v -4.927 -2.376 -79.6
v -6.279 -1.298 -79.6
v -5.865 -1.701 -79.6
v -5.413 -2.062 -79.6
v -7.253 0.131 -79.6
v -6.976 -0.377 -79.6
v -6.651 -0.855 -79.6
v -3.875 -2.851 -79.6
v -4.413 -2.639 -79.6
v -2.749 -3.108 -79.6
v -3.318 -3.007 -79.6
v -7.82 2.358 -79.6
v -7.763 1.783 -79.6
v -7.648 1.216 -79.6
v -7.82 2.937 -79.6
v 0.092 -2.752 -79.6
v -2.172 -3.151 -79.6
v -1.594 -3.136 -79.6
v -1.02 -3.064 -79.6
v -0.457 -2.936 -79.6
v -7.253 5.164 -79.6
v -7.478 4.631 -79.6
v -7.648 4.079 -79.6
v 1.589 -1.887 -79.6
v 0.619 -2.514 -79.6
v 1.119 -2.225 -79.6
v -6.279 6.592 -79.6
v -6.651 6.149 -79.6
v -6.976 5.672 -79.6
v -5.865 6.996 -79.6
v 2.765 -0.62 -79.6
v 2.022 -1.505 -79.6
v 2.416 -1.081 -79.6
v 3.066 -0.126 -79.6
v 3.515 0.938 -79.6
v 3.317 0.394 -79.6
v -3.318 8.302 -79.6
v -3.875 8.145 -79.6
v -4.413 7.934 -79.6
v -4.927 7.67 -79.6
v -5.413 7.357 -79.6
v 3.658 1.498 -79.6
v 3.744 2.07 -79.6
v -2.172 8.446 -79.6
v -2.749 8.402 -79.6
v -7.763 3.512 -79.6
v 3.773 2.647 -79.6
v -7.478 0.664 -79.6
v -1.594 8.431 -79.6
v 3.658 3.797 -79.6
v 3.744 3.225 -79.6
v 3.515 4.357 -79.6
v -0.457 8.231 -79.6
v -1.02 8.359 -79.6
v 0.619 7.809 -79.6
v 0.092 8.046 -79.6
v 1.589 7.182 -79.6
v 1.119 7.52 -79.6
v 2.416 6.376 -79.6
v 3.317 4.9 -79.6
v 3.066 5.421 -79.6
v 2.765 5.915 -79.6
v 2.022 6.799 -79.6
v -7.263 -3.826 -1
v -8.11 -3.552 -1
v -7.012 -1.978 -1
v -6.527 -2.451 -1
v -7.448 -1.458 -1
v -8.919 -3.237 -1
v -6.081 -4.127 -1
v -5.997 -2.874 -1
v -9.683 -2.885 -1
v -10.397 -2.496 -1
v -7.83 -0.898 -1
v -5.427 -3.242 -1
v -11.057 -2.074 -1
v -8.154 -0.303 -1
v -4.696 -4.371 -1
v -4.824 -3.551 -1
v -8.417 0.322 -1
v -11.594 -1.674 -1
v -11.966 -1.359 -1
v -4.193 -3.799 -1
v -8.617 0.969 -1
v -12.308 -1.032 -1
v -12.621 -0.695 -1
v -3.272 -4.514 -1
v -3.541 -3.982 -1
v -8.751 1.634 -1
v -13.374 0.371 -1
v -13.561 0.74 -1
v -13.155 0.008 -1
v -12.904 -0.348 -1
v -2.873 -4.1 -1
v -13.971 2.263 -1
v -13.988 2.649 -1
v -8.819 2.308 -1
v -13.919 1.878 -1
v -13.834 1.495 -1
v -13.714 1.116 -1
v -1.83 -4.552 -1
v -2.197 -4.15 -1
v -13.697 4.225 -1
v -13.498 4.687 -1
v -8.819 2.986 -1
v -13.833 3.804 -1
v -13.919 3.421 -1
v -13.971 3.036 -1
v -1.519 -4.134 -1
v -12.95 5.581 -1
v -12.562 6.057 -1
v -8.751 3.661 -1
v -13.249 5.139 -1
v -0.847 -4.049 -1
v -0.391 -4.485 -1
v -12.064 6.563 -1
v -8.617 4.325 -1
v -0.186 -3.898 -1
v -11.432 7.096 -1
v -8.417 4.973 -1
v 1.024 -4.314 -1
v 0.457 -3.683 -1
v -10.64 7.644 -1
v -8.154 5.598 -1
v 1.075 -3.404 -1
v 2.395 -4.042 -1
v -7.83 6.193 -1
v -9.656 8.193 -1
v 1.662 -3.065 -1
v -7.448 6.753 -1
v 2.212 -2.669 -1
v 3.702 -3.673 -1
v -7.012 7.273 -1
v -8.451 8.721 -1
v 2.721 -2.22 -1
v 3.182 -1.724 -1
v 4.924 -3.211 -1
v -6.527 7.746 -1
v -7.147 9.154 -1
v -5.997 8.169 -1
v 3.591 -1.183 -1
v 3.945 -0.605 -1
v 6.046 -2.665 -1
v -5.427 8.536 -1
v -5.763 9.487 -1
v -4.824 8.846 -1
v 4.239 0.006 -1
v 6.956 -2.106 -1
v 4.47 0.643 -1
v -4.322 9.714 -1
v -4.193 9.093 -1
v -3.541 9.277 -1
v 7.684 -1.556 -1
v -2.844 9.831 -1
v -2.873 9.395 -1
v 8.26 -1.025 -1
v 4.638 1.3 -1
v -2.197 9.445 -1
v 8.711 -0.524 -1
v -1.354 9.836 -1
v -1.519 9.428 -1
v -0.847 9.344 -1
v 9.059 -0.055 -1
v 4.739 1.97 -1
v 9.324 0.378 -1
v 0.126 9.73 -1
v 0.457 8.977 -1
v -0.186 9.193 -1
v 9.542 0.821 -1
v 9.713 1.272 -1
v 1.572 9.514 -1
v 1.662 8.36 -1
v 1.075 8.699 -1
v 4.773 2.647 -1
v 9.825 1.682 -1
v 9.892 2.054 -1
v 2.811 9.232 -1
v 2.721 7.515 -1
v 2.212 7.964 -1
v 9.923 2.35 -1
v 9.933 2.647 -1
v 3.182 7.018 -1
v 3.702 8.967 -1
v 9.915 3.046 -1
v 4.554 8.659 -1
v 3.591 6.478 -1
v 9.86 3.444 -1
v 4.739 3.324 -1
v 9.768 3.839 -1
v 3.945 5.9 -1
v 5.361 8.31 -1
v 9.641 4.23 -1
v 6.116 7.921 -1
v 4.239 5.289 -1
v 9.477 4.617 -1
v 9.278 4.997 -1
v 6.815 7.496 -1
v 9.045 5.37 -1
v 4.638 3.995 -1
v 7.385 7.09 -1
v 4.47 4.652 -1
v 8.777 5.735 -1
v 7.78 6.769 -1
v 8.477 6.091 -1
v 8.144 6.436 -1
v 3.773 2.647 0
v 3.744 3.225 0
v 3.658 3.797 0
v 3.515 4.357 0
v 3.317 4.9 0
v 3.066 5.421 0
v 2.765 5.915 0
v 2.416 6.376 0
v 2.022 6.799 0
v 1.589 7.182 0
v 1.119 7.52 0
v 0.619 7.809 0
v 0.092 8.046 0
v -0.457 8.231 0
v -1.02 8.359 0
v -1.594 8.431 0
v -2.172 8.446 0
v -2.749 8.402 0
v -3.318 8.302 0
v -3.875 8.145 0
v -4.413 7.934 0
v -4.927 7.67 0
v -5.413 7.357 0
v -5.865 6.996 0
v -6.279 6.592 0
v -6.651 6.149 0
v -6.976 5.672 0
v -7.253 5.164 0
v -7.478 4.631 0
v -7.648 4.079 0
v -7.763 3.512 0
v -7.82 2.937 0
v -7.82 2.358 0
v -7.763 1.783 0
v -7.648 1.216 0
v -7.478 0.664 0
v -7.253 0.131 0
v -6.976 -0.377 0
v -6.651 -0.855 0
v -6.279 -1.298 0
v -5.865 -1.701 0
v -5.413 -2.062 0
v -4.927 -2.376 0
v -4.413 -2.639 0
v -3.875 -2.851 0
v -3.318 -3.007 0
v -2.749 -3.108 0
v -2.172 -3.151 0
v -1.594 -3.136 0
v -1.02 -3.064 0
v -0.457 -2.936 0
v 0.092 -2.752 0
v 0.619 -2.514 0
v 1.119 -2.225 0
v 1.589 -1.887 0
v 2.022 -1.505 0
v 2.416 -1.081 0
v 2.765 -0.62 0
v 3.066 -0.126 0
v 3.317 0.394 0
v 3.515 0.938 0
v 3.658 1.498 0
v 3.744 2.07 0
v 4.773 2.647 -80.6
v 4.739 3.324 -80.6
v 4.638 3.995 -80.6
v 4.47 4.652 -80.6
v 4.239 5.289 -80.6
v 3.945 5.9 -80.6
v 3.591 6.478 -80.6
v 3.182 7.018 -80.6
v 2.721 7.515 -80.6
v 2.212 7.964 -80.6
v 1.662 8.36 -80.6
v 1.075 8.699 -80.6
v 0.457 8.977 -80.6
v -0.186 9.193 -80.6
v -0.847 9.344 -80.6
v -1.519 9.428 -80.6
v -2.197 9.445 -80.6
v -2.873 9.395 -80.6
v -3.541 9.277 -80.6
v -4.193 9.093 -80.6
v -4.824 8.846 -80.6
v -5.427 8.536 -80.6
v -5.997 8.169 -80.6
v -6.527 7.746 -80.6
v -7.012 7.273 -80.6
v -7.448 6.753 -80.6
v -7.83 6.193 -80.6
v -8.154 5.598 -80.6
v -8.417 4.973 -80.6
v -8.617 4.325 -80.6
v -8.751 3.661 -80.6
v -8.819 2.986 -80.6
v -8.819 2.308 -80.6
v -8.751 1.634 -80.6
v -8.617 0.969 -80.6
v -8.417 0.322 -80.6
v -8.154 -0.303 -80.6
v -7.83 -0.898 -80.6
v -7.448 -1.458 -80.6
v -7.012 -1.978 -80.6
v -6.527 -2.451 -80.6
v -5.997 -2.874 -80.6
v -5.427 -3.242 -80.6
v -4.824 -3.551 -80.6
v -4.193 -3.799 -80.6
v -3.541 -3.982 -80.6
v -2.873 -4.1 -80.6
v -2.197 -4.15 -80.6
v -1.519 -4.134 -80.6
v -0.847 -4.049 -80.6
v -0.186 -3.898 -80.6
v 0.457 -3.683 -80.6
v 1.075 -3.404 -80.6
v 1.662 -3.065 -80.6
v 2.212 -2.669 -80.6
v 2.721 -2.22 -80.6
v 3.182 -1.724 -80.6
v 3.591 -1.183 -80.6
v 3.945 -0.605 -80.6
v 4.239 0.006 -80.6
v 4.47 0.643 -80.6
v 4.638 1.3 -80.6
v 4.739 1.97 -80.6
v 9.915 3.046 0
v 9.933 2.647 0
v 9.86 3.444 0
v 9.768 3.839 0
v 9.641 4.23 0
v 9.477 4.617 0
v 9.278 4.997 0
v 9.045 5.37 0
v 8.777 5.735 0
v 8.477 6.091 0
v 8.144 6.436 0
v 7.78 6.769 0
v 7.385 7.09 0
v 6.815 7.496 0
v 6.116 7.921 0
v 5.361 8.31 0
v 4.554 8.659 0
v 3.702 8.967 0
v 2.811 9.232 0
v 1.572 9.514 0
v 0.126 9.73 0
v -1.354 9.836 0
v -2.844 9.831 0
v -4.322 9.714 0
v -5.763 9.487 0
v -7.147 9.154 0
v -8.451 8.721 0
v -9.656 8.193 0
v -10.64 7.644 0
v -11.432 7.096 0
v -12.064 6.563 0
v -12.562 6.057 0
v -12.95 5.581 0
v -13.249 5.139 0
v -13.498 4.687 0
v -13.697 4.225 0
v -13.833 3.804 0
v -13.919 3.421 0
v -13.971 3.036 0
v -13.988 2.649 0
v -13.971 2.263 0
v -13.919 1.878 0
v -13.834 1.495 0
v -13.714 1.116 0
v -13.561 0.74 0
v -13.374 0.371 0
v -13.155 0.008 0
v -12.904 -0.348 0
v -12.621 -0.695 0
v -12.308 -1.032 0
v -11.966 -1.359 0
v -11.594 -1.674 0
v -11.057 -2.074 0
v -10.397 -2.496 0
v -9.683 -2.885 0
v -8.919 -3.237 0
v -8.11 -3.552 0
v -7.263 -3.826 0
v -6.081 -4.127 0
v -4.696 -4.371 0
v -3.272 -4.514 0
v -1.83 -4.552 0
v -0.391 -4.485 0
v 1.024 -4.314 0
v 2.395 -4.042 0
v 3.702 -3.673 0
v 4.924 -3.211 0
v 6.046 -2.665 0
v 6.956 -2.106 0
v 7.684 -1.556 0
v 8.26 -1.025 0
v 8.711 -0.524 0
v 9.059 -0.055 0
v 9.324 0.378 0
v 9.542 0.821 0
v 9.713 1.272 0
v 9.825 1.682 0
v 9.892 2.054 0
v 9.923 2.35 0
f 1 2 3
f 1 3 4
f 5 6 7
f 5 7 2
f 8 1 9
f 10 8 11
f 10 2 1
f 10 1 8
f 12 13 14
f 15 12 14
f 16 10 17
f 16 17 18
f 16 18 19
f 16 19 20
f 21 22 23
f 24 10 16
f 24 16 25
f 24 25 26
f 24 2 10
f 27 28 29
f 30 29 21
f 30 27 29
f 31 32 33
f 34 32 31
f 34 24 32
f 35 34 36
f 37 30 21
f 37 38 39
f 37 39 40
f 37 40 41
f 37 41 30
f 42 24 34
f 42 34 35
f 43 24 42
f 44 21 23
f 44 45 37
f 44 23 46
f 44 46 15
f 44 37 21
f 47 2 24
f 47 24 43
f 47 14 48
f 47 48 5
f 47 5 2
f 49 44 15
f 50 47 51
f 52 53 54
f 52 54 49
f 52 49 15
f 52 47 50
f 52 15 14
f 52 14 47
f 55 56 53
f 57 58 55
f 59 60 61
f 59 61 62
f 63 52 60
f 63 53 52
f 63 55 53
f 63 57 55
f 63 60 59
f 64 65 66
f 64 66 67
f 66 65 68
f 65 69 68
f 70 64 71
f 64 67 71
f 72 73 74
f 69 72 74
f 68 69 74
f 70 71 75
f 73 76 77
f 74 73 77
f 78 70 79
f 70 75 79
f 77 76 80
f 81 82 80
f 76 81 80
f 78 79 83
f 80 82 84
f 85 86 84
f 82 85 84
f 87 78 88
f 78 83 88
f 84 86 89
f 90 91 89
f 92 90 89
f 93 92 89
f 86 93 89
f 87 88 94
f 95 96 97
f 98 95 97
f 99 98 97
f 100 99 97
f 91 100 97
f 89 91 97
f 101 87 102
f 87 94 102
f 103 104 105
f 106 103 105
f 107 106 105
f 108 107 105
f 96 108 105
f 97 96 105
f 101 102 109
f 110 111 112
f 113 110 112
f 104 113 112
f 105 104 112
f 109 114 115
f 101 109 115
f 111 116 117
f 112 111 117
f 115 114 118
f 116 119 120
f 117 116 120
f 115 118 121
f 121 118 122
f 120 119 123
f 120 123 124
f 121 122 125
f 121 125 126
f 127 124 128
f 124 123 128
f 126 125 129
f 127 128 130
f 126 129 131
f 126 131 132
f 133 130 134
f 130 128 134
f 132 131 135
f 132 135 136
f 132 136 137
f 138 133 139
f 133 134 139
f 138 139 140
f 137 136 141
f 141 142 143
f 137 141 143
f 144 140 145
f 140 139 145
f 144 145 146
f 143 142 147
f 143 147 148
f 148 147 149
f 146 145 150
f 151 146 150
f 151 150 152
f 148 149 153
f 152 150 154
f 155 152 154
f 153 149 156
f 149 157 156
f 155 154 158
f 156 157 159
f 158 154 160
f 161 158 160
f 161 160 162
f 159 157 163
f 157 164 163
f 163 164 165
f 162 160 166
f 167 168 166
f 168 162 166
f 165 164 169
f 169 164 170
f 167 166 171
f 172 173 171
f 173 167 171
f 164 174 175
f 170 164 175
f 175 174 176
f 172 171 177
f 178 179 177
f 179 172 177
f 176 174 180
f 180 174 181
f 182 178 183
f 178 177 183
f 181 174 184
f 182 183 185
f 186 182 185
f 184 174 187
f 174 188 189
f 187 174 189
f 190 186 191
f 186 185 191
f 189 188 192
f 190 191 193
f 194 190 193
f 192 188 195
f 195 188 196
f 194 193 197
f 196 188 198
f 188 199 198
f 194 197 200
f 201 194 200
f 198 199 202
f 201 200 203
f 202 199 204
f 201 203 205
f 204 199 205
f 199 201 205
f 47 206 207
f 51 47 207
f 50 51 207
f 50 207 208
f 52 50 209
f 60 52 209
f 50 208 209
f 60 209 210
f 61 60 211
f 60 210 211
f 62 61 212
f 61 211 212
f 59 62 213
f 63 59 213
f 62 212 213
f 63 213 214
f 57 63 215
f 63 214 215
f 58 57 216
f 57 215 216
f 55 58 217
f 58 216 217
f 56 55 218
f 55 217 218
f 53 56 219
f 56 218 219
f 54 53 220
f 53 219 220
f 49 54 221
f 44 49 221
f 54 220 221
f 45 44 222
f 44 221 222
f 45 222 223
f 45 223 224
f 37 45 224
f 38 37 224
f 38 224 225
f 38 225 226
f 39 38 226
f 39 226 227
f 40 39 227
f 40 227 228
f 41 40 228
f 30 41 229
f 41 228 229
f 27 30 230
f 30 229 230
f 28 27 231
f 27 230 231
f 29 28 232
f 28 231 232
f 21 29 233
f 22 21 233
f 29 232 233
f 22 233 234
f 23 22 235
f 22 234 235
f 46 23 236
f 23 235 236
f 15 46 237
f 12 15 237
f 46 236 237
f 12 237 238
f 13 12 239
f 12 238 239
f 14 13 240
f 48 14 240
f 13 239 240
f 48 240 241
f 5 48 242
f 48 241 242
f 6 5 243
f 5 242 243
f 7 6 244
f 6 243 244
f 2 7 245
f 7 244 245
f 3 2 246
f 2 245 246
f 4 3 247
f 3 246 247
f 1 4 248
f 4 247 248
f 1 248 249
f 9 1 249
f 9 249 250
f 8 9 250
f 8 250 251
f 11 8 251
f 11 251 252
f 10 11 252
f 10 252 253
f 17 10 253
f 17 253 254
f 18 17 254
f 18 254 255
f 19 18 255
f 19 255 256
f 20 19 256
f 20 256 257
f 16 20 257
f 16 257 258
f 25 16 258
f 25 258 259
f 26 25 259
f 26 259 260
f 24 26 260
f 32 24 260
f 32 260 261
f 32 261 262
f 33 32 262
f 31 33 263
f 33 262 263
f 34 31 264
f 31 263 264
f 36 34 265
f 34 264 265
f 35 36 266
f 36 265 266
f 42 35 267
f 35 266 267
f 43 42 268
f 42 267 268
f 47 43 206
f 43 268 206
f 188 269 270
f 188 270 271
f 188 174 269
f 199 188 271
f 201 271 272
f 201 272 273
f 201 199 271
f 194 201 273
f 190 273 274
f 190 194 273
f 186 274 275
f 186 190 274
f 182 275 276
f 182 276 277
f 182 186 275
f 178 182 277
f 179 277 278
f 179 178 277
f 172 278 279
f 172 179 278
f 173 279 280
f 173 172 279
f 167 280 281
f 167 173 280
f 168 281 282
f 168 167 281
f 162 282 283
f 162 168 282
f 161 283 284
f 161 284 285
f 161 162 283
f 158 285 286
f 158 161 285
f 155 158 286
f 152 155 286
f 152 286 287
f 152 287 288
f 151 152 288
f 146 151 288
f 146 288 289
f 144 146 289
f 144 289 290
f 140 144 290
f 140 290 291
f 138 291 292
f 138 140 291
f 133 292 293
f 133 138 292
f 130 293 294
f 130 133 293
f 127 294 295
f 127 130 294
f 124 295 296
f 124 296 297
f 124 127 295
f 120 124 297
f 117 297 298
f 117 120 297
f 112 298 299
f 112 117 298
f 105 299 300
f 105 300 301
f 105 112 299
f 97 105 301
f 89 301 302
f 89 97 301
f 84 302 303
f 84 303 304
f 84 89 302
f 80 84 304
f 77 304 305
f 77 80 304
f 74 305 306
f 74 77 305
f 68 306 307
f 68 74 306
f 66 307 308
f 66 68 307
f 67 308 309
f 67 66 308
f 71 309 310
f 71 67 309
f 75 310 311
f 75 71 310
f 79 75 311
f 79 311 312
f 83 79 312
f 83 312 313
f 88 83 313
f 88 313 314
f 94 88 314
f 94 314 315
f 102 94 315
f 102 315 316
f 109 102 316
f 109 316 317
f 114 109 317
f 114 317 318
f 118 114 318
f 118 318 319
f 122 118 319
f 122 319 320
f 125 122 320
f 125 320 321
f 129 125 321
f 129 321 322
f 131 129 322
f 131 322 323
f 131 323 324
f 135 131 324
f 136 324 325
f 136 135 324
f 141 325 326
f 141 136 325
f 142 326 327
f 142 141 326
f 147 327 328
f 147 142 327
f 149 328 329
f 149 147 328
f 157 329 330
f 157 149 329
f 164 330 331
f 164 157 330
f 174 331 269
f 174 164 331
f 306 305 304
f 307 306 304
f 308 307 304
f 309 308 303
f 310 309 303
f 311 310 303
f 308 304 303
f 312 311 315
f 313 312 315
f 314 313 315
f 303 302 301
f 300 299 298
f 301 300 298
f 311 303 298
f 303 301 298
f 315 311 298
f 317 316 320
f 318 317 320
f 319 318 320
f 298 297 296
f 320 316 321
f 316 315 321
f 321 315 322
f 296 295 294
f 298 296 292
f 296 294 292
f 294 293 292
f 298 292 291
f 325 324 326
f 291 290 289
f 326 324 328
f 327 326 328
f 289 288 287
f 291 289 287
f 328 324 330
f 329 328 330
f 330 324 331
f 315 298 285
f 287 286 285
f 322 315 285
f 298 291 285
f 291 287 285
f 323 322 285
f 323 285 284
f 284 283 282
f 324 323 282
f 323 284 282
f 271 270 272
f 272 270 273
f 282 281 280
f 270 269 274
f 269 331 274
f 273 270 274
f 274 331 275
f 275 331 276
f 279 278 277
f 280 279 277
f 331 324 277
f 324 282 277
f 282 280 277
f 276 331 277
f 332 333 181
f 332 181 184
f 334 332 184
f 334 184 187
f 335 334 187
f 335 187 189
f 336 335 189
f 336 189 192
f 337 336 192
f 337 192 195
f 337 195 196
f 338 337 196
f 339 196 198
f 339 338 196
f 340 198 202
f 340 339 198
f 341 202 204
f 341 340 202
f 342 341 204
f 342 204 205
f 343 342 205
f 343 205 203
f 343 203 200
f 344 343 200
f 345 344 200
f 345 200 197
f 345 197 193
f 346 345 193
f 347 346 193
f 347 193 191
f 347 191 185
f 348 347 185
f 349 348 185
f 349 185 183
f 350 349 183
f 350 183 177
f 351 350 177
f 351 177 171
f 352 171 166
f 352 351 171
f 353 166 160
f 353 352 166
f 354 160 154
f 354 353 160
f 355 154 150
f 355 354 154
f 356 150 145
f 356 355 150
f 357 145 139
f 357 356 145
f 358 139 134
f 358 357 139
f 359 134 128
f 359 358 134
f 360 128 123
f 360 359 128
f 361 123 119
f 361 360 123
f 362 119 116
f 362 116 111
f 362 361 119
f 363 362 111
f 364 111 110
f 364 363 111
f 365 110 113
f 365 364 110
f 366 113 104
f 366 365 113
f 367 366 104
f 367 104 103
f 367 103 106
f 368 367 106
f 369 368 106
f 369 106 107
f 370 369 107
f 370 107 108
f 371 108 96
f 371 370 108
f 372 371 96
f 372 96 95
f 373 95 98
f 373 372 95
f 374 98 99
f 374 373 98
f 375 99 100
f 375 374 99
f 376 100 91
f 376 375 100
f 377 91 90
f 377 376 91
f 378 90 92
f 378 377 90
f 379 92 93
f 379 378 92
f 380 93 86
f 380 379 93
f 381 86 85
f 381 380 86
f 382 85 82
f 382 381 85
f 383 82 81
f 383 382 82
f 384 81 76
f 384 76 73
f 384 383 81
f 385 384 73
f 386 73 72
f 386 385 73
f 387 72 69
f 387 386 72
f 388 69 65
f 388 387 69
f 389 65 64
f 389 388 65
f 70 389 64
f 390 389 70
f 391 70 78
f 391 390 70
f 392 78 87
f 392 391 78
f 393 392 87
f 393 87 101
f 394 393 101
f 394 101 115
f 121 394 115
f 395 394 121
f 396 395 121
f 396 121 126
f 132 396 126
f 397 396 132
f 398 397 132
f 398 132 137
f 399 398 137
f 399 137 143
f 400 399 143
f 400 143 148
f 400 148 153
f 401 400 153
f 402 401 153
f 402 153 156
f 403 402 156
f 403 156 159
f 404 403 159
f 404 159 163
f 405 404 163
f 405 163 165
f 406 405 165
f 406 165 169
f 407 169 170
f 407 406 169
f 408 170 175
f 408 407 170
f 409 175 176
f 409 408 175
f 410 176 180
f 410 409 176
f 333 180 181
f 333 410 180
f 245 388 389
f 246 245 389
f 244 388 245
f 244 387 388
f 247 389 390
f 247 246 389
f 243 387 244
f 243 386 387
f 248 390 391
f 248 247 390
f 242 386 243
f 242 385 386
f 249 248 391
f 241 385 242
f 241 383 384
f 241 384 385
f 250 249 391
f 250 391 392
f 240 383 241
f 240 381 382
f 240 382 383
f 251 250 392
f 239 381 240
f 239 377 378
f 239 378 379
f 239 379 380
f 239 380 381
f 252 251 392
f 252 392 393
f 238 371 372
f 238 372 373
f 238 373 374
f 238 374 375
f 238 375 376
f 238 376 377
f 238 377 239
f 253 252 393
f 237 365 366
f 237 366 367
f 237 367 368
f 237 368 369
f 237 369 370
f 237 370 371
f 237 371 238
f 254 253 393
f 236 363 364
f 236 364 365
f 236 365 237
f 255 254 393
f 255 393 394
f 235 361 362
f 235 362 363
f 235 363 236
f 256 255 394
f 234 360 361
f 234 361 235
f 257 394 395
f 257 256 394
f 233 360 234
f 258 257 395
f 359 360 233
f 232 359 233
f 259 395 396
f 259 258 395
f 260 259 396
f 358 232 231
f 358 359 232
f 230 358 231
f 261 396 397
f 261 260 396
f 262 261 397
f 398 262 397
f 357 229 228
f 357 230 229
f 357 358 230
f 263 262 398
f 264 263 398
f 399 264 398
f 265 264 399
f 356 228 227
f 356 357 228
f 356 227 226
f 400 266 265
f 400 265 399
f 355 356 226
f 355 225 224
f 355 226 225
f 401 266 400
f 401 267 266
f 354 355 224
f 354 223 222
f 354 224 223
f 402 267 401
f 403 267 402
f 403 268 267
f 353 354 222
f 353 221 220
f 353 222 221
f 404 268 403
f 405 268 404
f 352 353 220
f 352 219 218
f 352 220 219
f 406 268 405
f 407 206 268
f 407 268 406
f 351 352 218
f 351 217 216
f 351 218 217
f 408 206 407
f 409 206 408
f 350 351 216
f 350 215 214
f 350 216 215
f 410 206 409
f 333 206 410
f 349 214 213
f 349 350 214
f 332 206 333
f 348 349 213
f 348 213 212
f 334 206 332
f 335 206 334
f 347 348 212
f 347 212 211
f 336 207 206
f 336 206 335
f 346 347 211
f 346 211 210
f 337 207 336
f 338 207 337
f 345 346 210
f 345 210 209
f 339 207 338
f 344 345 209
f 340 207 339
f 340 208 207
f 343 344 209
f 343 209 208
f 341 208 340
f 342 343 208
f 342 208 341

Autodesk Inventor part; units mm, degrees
ref_plane "YZ Plane" through (0, 0, 0) normal (1, 0, 0) x (0, 1, 0)
ref_plane "XZ Plane" through (0, 0, 0) normal (0, 1, 0) x (-1, 0, 0)
ref_plane "XY Plane" through (0, 0, 0) normal (0, 0, 1) x (1, 0, 0)
sketch "Sketch2" plane through (0, 0, 0) normal (0, 0, 1) x (1, 0, 0)
  circle A0 centre (-2.0274, 2.6474) radius 6.8
  ellipse E0 centre (-2.0274, 2.6474) end of major axis (-2.0274, -4.5526) minor radius 11.9605
  circle A1 centre (-2.0274, 2.6474) radius 5.8
  point P0 (0, 0)
  dimension "d25" = 1
extrude "Extrusion5" add sketch "Sketch2" against normal blind 80.6 contours A0 | A1
extrude "Extrusion6" add sketch "Sketch2" against normal blind 1 contours E0
extrude "Extrusion7" cut sketch "Sketch2" against normal blind 79.6 contours A1
properties part number "seringa outer" material "Glass"
